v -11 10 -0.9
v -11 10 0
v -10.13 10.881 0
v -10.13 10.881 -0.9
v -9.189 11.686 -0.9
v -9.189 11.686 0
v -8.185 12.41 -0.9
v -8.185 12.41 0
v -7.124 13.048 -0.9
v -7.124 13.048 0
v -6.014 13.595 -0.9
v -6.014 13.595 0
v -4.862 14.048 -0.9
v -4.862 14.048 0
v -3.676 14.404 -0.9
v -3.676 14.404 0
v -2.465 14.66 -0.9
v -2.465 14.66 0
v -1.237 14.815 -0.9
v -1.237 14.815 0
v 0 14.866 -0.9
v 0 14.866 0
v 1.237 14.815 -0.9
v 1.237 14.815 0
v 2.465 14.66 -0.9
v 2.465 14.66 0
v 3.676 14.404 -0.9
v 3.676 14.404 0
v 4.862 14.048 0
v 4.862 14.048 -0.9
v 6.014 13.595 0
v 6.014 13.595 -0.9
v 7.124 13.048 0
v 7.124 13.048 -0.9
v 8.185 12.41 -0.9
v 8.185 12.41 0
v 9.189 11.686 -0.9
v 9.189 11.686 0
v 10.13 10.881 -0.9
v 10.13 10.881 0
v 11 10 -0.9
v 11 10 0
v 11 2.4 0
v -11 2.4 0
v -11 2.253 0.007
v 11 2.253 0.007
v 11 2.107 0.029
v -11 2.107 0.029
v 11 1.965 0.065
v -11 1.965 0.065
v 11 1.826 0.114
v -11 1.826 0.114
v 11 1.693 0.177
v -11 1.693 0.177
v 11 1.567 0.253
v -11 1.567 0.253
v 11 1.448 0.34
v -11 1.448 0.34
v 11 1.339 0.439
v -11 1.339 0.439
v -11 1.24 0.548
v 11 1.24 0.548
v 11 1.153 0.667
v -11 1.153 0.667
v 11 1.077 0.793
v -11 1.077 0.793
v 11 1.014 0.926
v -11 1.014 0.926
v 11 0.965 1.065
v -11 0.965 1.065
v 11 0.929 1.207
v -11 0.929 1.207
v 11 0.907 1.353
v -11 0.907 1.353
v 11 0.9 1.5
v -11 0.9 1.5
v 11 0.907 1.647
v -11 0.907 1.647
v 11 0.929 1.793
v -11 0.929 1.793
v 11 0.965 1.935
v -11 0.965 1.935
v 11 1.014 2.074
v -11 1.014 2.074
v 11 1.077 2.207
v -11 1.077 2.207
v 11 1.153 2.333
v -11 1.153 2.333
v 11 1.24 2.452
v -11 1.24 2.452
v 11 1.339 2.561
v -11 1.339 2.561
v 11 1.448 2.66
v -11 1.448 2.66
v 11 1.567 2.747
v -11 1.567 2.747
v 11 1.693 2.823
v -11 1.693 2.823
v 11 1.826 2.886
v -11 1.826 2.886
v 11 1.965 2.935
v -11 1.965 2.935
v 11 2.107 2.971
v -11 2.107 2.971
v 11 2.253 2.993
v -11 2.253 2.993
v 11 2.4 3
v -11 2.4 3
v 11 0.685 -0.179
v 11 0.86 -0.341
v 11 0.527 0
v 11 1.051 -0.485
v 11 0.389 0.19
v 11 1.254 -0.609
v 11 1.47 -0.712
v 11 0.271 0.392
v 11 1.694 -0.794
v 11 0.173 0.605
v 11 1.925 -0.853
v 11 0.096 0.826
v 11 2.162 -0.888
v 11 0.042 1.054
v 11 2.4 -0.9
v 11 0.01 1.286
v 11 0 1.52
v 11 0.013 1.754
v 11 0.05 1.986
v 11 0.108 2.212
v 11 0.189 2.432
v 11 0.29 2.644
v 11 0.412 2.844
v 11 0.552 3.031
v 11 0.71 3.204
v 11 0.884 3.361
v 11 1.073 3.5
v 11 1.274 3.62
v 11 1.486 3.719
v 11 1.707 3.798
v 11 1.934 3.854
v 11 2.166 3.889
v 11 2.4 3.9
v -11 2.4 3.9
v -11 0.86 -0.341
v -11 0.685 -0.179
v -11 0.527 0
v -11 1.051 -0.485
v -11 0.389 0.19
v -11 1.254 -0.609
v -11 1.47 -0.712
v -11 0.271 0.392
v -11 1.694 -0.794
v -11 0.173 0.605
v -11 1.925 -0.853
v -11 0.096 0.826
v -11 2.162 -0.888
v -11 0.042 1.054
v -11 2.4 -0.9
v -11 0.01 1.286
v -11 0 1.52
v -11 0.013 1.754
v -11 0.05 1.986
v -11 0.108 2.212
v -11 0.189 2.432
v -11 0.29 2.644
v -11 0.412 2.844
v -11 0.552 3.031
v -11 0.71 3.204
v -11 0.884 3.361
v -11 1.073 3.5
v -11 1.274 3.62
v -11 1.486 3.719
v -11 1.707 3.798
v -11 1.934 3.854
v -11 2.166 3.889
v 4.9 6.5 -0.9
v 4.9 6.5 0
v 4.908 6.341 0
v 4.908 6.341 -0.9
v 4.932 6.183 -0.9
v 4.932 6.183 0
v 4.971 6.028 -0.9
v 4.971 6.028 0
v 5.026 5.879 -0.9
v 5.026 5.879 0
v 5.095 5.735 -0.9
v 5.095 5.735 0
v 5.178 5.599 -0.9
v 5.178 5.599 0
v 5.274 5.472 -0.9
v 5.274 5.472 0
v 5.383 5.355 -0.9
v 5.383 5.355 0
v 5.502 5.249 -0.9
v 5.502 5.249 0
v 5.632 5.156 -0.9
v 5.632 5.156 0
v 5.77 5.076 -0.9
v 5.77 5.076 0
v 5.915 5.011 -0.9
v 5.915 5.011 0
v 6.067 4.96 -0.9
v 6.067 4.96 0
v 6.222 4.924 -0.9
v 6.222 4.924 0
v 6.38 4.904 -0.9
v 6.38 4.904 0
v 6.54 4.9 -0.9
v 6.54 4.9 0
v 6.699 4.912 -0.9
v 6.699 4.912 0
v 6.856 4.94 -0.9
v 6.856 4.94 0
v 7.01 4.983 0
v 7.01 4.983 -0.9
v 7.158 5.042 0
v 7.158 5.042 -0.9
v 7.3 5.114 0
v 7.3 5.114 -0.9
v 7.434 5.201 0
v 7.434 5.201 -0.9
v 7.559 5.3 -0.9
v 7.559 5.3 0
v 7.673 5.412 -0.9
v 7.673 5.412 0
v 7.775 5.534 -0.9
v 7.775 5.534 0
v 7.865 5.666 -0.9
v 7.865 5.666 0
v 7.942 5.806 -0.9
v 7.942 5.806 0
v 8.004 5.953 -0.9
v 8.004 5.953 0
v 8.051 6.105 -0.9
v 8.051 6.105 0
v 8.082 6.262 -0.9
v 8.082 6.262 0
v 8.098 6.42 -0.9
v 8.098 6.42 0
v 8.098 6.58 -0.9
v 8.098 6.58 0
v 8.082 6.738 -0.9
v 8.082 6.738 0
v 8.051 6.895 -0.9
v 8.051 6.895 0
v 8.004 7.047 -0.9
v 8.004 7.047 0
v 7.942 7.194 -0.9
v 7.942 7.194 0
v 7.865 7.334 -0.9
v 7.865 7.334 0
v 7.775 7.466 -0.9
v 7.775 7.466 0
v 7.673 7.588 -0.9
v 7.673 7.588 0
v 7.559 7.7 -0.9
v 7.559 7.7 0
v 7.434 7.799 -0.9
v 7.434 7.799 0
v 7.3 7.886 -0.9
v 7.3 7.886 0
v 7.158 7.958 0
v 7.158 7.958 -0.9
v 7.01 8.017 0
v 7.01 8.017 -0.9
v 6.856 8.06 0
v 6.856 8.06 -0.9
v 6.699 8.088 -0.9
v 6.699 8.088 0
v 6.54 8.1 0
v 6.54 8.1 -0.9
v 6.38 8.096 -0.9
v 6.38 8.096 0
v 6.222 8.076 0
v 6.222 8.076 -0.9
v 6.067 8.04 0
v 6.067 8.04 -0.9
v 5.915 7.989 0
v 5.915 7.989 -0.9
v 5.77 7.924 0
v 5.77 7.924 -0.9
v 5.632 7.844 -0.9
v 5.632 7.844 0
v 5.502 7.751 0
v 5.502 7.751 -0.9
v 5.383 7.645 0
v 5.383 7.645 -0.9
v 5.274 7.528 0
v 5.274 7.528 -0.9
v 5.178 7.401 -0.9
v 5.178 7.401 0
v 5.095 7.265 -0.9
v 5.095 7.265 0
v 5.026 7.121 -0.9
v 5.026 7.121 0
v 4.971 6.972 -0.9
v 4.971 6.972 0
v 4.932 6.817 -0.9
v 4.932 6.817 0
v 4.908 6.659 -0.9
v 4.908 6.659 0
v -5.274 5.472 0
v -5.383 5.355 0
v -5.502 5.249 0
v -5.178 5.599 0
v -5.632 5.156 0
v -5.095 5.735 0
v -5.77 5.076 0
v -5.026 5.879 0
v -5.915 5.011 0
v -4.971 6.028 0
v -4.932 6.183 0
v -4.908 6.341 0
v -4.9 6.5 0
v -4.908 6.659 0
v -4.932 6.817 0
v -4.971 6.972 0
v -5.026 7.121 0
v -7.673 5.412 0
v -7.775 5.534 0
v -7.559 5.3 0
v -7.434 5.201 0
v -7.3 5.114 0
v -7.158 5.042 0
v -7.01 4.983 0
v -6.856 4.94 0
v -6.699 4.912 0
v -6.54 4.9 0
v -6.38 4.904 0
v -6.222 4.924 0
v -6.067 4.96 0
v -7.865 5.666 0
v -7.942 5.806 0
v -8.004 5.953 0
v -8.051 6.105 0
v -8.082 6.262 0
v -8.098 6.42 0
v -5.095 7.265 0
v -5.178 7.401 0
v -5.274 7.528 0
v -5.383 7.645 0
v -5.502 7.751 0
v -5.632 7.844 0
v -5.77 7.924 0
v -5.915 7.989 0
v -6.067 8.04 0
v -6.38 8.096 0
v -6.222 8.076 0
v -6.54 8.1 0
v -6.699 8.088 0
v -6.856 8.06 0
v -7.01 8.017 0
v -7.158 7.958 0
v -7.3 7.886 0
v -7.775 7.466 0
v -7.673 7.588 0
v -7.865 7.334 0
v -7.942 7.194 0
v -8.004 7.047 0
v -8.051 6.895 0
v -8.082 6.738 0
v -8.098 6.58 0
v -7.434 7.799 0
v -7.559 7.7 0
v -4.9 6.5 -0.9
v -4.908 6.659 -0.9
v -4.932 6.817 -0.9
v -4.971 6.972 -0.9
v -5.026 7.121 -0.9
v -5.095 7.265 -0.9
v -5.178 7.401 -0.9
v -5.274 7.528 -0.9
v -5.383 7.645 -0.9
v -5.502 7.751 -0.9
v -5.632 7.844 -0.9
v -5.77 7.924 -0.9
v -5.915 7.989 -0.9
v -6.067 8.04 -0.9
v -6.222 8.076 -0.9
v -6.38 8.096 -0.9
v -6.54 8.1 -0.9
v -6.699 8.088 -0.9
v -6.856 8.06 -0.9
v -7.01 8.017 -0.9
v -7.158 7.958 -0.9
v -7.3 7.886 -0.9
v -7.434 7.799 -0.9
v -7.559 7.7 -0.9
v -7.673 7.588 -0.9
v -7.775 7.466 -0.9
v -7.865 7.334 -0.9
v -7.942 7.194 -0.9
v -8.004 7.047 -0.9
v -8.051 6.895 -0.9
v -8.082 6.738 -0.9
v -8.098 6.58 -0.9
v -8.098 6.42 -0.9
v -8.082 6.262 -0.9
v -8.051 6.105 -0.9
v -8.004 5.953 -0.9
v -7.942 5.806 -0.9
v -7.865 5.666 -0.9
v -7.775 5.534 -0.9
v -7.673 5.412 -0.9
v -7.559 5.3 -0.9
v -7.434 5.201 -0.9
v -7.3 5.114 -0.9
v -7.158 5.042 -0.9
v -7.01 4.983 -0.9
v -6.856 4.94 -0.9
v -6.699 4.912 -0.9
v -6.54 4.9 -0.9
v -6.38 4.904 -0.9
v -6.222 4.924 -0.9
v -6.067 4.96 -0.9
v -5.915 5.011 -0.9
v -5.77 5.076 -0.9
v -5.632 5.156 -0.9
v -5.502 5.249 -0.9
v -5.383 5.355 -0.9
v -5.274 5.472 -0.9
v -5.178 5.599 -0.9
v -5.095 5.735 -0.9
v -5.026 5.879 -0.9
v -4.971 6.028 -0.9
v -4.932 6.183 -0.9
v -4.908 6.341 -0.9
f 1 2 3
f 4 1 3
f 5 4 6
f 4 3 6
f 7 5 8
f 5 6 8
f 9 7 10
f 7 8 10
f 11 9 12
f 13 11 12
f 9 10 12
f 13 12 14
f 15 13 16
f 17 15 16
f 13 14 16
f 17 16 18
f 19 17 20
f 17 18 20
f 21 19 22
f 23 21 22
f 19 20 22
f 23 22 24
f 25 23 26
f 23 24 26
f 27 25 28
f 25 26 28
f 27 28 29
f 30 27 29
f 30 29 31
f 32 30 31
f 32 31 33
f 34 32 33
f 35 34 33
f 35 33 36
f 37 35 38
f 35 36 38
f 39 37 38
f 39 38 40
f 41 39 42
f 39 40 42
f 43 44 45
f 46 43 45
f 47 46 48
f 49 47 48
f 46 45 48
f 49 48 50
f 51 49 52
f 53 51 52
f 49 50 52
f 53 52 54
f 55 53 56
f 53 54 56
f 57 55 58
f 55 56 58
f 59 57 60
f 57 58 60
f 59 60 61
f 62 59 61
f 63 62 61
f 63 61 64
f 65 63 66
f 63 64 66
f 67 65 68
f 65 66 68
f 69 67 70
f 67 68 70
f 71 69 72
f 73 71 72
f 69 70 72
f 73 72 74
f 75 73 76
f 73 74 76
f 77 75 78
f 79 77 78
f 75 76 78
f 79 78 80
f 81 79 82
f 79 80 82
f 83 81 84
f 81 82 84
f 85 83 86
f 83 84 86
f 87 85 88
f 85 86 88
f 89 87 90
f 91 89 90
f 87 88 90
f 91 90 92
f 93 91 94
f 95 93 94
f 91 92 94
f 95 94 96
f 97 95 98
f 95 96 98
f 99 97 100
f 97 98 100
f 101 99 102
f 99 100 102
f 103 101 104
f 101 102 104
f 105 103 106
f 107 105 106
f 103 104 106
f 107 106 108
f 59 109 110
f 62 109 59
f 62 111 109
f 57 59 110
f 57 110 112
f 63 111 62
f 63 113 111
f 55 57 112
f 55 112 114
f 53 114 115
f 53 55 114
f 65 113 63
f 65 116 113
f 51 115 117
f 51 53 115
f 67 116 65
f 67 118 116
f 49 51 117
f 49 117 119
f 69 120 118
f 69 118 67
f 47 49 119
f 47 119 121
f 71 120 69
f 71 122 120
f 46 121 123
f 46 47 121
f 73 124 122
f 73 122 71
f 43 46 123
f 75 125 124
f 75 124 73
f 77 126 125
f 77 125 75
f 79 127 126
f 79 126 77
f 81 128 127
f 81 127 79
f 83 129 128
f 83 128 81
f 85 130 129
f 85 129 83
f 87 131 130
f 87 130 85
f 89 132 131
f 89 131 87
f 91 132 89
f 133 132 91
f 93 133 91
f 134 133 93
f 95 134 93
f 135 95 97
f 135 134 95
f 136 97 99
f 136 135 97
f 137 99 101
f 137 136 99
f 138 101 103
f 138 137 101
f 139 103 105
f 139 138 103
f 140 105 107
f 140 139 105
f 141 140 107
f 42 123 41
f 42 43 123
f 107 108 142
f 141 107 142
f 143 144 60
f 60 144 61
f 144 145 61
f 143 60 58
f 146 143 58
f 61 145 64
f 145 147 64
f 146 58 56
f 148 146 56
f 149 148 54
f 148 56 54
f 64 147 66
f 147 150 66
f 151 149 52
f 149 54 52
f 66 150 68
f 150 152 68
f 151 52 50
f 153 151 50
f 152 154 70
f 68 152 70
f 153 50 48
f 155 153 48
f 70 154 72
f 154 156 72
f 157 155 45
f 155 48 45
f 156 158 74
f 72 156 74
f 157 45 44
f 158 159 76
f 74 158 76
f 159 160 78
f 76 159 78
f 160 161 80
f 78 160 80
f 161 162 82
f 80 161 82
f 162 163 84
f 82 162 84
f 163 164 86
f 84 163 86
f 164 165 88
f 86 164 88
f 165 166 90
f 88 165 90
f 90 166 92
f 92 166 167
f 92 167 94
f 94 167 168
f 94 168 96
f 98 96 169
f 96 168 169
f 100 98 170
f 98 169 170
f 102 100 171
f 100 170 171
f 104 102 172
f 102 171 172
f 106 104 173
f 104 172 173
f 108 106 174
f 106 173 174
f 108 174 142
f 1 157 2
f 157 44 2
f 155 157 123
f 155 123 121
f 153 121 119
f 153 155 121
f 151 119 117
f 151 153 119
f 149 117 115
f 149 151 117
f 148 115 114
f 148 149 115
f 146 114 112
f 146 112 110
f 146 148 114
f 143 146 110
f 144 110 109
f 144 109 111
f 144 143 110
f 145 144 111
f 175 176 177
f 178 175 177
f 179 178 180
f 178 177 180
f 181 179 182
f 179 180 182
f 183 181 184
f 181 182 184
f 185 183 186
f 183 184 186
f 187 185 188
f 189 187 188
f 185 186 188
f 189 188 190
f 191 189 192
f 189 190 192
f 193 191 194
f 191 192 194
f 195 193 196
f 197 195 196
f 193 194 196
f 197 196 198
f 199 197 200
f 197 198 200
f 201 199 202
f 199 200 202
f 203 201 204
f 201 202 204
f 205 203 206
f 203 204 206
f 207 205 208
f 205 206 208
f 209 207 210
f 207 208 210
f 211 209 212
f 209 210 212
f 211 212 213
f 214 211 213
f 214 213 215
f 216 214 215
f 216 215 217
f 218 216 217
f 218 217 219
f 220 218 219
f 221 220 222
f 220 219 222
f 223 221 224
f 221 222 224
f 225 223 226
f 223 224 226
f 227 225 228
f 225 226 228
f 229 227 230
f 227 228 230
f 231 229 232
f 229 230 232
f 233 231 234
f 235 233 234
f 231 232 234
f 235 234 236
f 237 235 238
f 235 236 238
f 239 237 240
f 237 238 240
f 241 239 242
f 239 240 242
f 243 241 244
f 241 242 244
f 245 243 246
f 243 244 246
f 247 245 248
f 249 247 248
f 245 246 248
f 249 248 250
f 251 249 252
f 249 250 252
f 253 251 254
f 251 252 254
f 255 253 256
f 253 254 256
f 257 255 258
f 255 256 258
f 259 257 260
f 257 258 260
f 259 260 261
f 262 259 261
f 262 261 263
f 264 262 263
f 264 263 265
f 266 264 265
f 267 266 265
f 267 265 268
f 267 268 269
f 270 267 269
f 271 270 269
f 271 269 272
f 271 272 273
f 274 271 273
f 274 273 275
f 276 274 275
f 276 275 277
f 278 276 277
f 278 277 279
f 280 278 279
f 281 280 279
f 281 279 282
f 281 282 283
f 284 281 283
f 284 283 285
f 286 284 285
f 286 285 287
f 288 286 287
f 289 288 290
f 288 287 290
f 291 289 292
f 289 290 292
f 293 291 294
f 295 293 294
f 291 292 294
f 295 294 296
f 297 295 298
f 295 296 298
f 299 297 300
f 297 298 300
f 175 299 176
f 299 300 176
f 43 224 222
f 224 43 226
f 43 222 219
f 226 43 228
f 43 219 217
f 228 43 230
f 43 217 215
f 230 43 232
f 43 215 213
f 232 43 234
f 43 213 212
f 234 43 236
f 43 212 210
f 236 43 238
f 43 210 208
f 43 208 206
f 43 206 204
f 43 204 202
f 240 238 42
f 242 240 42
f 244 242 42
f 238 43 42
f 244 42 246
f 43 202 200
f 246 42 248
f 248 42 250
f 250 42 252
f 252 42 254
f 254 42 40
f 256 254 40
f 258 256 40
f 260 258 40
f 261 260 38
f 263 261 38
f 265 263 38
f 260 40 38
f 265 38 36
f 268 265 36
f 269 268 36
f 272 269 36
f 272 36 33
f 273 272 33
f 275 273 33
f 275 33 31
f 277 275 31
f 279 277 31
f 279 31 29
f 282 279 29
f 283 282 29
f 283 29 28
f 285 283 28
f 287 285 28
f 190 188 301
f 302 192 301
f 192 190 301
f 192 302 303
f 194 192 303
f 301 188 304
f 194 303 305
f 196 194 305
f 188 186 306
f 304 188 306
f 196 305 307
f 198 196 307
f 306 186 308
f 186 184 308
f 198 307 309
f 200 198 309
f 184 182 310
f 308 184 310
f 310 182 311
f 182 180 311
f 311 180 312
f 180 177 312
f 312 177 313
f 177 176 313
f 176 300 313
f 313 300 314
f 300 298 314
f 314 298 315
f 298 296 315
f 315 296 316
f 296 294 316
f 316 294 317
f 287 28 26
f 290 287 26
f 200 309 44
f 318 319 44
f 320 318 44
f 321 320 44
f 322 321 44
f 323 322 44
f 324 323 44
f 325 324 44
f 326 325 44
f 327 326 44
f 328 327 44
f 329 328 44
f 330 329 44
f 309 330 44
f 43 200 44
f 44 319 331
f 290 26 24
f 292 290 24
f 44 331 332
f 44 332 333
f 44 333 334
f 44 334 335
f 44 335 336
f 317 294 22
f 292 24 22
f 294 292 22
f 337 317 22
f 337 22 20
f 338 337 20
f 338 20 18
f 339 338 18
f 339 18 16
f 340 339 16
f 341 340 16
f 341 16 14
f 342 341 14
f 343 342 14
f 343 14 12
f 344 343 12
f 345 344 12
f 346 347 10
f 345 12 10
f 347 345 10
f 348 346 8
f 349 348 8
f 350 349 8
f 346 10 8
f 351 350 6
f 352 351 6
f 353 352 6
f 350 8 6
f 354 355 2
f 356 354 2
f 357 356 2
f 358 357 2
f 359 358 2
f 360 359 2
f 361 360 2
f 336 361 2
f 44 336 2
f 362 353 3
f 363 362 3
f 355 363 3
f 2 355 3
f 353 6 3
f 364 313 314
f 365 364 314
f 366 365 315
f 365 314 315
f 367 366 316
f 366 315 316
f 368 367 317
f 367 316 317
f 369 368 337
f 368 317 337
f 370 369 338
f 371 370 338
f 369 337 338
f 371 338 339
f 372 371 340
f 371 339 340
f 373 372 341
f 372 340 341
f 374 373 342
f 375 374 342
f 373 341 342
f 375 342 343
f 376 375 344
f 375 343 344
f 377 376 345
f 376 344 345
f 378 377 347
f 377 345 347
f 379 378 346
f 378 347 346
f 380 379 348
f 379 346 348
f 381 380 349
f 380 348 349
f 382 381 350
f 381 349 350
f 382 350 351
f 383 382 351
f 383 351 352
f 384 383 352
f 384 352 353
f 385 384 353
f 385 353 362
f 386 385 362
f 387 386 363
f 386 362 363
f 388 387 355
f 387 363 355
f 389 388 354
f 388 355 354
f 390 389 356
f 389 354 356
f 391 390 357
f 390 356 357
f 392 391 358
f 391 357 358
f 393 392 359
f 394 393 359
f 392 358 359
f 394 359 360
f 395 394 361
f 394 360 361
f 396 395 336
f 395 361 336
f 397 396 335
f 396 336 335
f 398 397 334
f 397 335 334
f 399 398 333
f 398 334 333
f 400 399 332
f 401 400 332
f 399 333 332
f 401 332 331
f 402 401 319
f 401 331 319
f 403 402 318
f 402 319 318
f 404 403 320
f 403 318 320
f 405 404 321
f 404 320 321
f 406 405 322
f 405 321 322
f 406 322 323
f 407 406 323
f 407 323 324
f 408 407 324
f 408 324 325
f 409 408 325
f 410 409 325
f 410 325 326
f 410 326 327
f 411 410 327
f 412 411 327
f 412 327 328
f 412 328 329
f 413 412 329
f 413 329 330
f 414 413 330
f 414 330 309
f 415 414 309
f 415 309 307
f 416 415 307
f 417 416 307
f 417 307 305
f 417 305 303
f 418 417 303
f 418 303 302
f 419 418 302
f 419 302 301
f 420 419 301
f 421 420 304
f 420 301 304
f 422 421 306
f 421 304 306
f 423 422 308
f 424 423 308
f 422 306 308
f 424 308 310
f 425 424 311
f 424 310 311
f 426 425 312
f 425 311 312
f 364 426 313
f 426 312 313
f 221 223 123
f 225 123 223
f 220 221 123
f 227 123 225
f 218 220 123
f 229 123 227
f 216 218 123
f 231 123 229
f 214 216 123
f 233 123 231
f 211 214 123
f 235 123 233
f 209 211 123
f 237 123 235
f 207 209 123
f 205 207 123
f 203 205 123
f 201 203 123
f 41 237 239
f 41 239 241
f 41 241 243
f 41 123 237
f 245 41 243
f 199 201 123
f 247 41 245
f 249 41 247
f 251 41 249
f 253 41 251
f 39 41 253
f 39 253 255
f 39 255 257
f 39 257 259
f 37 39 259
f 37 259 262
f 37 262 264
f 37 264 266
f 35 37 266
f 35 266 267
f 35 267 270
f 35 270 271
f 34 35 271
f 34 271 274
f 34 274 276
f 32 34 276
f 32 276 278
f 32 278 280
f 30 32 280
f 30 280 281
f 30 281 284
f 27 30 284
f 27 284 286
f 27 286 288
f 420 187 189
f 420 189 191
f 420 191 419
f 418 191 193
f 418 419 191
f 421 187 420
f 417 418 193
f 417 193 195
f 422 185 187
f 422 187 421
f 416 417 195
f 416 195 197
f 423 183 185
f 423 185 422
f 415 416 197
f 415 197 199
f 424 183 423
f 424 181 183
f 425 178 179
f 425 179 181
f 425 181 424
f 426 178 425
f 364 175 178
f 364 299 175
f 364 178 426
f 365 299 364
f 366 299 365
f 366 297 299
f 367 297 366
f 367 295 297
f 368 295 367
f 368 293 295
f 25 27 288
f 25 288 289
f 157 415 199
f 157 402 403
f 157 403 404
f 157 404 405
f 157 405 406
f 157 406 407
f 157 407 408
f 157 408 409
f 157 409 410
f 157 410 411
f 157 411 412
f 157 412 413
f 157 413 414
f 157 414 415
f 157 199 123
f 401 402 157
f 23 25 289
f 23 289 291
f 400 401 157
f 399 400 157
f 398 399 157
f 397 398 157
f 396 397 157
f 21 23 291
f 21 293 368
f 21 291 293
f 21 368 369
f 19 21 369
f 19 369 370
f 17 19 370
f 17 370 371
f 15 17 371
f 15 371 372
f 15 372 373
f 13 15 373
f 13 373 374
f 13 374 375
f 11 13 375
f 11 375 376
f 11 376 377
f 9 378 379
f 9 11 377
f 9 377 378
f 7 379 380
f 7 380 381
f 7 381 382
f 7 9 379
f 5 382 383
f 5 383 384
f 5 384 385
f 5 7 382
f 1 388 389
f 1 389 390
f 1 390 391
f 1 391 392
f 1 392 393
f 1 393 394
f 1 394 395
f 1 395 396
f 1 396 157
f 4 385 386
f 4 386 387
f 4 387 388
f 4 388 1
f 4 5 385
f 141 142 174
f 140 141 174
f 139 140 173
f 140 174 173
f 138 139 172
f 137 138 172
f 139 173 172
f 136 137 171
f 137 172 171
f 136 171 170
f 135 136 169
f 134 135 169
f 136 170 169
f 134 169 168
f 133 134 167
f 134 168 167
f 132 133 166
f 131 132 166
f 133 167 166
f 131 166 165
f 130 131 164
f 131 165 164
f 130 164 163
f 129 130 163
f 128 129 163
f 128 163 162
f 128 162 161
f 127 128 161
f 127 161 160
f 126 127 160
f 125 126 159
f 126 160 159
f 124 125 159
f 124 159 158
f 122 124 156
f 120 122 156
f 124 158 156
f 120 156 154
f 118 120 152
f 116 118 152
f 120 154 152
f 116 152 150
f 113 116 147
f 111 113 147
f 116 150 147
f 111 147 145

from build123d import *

# Parameters (mm, degrees)
SKETCH_1_R             = 1.6
SM_BASE_FLANGE_1_DEPTH = 0.9
OTHER_START            = -11
OTHER_1_DEPTH          = 22
OTHER_1_2_DEPTH        = 22


# Read off the part's stored shape, not the designer's step: 褶边1
# Sheet-metal steps are written as plain solids
with BuildPart() as part:
    # Sketch 1 → 基体-法兰1 (new body)
    with BuildSketch(Plane.XY):
        with BuildLine():
            Line((11, 0), (-11, 0))
            Line((-11, 0), (-11, 10))
            ThreePointArc((-11, 10), (0, 14.866068747), (11, 10))
            Line((11, 10), (11, 0))
        make_face()
        with Locations((-6.5, 6.5)):
            Circle(SKETCH_1_R, mode=Mode.SUBTRACT)
        with Locations(Location((6.5, 6.5, 0), (0, 0, 180))):
            Circle(SKETCH_1_R, mode=Mode.SUBTRACT)
    extrude(amount=-SM_BASE_FLANGE_1_DEPTH)

    # Other 1 outline → Other 1 (cut)
    with BuildSketch(Plane.YZ.offset(OTHER_START)):
        with BuildLine():
            ThreePointArc((2.4, -0.9), (1.360769515, -0.663330765), (0.5265006, 0))
            Line((0.5265006, 0), (0, 0))
            Line((0, 0), (0, -0.9))
            Line((0, -0.9), (2.4, -0.9))
        make_face()
    extrude(amount=OTHER_1_DEPTH, mode=Mode.SUBTRACT)

    # Other 1 2 outline → Other 1 2 (add)
    with BuildSketch(Plane.YZ.offset(OTHER_START)):
        with BuildLine():
            Line((2.4, 3), (2.4, 3.9))
            ThreePointArc((2.4, 3.9), (0.236669235, 2.539230485), (0.5265006, 0))
            Line((0.5265006, 0), (2.4, 0))
            ThreePointArc((2.4, 0), (0.9, 1.5), (2.4, 3))
        make_face()
    extrude(amount=OTHER_1_2_DEPTH)


solid = part.part
